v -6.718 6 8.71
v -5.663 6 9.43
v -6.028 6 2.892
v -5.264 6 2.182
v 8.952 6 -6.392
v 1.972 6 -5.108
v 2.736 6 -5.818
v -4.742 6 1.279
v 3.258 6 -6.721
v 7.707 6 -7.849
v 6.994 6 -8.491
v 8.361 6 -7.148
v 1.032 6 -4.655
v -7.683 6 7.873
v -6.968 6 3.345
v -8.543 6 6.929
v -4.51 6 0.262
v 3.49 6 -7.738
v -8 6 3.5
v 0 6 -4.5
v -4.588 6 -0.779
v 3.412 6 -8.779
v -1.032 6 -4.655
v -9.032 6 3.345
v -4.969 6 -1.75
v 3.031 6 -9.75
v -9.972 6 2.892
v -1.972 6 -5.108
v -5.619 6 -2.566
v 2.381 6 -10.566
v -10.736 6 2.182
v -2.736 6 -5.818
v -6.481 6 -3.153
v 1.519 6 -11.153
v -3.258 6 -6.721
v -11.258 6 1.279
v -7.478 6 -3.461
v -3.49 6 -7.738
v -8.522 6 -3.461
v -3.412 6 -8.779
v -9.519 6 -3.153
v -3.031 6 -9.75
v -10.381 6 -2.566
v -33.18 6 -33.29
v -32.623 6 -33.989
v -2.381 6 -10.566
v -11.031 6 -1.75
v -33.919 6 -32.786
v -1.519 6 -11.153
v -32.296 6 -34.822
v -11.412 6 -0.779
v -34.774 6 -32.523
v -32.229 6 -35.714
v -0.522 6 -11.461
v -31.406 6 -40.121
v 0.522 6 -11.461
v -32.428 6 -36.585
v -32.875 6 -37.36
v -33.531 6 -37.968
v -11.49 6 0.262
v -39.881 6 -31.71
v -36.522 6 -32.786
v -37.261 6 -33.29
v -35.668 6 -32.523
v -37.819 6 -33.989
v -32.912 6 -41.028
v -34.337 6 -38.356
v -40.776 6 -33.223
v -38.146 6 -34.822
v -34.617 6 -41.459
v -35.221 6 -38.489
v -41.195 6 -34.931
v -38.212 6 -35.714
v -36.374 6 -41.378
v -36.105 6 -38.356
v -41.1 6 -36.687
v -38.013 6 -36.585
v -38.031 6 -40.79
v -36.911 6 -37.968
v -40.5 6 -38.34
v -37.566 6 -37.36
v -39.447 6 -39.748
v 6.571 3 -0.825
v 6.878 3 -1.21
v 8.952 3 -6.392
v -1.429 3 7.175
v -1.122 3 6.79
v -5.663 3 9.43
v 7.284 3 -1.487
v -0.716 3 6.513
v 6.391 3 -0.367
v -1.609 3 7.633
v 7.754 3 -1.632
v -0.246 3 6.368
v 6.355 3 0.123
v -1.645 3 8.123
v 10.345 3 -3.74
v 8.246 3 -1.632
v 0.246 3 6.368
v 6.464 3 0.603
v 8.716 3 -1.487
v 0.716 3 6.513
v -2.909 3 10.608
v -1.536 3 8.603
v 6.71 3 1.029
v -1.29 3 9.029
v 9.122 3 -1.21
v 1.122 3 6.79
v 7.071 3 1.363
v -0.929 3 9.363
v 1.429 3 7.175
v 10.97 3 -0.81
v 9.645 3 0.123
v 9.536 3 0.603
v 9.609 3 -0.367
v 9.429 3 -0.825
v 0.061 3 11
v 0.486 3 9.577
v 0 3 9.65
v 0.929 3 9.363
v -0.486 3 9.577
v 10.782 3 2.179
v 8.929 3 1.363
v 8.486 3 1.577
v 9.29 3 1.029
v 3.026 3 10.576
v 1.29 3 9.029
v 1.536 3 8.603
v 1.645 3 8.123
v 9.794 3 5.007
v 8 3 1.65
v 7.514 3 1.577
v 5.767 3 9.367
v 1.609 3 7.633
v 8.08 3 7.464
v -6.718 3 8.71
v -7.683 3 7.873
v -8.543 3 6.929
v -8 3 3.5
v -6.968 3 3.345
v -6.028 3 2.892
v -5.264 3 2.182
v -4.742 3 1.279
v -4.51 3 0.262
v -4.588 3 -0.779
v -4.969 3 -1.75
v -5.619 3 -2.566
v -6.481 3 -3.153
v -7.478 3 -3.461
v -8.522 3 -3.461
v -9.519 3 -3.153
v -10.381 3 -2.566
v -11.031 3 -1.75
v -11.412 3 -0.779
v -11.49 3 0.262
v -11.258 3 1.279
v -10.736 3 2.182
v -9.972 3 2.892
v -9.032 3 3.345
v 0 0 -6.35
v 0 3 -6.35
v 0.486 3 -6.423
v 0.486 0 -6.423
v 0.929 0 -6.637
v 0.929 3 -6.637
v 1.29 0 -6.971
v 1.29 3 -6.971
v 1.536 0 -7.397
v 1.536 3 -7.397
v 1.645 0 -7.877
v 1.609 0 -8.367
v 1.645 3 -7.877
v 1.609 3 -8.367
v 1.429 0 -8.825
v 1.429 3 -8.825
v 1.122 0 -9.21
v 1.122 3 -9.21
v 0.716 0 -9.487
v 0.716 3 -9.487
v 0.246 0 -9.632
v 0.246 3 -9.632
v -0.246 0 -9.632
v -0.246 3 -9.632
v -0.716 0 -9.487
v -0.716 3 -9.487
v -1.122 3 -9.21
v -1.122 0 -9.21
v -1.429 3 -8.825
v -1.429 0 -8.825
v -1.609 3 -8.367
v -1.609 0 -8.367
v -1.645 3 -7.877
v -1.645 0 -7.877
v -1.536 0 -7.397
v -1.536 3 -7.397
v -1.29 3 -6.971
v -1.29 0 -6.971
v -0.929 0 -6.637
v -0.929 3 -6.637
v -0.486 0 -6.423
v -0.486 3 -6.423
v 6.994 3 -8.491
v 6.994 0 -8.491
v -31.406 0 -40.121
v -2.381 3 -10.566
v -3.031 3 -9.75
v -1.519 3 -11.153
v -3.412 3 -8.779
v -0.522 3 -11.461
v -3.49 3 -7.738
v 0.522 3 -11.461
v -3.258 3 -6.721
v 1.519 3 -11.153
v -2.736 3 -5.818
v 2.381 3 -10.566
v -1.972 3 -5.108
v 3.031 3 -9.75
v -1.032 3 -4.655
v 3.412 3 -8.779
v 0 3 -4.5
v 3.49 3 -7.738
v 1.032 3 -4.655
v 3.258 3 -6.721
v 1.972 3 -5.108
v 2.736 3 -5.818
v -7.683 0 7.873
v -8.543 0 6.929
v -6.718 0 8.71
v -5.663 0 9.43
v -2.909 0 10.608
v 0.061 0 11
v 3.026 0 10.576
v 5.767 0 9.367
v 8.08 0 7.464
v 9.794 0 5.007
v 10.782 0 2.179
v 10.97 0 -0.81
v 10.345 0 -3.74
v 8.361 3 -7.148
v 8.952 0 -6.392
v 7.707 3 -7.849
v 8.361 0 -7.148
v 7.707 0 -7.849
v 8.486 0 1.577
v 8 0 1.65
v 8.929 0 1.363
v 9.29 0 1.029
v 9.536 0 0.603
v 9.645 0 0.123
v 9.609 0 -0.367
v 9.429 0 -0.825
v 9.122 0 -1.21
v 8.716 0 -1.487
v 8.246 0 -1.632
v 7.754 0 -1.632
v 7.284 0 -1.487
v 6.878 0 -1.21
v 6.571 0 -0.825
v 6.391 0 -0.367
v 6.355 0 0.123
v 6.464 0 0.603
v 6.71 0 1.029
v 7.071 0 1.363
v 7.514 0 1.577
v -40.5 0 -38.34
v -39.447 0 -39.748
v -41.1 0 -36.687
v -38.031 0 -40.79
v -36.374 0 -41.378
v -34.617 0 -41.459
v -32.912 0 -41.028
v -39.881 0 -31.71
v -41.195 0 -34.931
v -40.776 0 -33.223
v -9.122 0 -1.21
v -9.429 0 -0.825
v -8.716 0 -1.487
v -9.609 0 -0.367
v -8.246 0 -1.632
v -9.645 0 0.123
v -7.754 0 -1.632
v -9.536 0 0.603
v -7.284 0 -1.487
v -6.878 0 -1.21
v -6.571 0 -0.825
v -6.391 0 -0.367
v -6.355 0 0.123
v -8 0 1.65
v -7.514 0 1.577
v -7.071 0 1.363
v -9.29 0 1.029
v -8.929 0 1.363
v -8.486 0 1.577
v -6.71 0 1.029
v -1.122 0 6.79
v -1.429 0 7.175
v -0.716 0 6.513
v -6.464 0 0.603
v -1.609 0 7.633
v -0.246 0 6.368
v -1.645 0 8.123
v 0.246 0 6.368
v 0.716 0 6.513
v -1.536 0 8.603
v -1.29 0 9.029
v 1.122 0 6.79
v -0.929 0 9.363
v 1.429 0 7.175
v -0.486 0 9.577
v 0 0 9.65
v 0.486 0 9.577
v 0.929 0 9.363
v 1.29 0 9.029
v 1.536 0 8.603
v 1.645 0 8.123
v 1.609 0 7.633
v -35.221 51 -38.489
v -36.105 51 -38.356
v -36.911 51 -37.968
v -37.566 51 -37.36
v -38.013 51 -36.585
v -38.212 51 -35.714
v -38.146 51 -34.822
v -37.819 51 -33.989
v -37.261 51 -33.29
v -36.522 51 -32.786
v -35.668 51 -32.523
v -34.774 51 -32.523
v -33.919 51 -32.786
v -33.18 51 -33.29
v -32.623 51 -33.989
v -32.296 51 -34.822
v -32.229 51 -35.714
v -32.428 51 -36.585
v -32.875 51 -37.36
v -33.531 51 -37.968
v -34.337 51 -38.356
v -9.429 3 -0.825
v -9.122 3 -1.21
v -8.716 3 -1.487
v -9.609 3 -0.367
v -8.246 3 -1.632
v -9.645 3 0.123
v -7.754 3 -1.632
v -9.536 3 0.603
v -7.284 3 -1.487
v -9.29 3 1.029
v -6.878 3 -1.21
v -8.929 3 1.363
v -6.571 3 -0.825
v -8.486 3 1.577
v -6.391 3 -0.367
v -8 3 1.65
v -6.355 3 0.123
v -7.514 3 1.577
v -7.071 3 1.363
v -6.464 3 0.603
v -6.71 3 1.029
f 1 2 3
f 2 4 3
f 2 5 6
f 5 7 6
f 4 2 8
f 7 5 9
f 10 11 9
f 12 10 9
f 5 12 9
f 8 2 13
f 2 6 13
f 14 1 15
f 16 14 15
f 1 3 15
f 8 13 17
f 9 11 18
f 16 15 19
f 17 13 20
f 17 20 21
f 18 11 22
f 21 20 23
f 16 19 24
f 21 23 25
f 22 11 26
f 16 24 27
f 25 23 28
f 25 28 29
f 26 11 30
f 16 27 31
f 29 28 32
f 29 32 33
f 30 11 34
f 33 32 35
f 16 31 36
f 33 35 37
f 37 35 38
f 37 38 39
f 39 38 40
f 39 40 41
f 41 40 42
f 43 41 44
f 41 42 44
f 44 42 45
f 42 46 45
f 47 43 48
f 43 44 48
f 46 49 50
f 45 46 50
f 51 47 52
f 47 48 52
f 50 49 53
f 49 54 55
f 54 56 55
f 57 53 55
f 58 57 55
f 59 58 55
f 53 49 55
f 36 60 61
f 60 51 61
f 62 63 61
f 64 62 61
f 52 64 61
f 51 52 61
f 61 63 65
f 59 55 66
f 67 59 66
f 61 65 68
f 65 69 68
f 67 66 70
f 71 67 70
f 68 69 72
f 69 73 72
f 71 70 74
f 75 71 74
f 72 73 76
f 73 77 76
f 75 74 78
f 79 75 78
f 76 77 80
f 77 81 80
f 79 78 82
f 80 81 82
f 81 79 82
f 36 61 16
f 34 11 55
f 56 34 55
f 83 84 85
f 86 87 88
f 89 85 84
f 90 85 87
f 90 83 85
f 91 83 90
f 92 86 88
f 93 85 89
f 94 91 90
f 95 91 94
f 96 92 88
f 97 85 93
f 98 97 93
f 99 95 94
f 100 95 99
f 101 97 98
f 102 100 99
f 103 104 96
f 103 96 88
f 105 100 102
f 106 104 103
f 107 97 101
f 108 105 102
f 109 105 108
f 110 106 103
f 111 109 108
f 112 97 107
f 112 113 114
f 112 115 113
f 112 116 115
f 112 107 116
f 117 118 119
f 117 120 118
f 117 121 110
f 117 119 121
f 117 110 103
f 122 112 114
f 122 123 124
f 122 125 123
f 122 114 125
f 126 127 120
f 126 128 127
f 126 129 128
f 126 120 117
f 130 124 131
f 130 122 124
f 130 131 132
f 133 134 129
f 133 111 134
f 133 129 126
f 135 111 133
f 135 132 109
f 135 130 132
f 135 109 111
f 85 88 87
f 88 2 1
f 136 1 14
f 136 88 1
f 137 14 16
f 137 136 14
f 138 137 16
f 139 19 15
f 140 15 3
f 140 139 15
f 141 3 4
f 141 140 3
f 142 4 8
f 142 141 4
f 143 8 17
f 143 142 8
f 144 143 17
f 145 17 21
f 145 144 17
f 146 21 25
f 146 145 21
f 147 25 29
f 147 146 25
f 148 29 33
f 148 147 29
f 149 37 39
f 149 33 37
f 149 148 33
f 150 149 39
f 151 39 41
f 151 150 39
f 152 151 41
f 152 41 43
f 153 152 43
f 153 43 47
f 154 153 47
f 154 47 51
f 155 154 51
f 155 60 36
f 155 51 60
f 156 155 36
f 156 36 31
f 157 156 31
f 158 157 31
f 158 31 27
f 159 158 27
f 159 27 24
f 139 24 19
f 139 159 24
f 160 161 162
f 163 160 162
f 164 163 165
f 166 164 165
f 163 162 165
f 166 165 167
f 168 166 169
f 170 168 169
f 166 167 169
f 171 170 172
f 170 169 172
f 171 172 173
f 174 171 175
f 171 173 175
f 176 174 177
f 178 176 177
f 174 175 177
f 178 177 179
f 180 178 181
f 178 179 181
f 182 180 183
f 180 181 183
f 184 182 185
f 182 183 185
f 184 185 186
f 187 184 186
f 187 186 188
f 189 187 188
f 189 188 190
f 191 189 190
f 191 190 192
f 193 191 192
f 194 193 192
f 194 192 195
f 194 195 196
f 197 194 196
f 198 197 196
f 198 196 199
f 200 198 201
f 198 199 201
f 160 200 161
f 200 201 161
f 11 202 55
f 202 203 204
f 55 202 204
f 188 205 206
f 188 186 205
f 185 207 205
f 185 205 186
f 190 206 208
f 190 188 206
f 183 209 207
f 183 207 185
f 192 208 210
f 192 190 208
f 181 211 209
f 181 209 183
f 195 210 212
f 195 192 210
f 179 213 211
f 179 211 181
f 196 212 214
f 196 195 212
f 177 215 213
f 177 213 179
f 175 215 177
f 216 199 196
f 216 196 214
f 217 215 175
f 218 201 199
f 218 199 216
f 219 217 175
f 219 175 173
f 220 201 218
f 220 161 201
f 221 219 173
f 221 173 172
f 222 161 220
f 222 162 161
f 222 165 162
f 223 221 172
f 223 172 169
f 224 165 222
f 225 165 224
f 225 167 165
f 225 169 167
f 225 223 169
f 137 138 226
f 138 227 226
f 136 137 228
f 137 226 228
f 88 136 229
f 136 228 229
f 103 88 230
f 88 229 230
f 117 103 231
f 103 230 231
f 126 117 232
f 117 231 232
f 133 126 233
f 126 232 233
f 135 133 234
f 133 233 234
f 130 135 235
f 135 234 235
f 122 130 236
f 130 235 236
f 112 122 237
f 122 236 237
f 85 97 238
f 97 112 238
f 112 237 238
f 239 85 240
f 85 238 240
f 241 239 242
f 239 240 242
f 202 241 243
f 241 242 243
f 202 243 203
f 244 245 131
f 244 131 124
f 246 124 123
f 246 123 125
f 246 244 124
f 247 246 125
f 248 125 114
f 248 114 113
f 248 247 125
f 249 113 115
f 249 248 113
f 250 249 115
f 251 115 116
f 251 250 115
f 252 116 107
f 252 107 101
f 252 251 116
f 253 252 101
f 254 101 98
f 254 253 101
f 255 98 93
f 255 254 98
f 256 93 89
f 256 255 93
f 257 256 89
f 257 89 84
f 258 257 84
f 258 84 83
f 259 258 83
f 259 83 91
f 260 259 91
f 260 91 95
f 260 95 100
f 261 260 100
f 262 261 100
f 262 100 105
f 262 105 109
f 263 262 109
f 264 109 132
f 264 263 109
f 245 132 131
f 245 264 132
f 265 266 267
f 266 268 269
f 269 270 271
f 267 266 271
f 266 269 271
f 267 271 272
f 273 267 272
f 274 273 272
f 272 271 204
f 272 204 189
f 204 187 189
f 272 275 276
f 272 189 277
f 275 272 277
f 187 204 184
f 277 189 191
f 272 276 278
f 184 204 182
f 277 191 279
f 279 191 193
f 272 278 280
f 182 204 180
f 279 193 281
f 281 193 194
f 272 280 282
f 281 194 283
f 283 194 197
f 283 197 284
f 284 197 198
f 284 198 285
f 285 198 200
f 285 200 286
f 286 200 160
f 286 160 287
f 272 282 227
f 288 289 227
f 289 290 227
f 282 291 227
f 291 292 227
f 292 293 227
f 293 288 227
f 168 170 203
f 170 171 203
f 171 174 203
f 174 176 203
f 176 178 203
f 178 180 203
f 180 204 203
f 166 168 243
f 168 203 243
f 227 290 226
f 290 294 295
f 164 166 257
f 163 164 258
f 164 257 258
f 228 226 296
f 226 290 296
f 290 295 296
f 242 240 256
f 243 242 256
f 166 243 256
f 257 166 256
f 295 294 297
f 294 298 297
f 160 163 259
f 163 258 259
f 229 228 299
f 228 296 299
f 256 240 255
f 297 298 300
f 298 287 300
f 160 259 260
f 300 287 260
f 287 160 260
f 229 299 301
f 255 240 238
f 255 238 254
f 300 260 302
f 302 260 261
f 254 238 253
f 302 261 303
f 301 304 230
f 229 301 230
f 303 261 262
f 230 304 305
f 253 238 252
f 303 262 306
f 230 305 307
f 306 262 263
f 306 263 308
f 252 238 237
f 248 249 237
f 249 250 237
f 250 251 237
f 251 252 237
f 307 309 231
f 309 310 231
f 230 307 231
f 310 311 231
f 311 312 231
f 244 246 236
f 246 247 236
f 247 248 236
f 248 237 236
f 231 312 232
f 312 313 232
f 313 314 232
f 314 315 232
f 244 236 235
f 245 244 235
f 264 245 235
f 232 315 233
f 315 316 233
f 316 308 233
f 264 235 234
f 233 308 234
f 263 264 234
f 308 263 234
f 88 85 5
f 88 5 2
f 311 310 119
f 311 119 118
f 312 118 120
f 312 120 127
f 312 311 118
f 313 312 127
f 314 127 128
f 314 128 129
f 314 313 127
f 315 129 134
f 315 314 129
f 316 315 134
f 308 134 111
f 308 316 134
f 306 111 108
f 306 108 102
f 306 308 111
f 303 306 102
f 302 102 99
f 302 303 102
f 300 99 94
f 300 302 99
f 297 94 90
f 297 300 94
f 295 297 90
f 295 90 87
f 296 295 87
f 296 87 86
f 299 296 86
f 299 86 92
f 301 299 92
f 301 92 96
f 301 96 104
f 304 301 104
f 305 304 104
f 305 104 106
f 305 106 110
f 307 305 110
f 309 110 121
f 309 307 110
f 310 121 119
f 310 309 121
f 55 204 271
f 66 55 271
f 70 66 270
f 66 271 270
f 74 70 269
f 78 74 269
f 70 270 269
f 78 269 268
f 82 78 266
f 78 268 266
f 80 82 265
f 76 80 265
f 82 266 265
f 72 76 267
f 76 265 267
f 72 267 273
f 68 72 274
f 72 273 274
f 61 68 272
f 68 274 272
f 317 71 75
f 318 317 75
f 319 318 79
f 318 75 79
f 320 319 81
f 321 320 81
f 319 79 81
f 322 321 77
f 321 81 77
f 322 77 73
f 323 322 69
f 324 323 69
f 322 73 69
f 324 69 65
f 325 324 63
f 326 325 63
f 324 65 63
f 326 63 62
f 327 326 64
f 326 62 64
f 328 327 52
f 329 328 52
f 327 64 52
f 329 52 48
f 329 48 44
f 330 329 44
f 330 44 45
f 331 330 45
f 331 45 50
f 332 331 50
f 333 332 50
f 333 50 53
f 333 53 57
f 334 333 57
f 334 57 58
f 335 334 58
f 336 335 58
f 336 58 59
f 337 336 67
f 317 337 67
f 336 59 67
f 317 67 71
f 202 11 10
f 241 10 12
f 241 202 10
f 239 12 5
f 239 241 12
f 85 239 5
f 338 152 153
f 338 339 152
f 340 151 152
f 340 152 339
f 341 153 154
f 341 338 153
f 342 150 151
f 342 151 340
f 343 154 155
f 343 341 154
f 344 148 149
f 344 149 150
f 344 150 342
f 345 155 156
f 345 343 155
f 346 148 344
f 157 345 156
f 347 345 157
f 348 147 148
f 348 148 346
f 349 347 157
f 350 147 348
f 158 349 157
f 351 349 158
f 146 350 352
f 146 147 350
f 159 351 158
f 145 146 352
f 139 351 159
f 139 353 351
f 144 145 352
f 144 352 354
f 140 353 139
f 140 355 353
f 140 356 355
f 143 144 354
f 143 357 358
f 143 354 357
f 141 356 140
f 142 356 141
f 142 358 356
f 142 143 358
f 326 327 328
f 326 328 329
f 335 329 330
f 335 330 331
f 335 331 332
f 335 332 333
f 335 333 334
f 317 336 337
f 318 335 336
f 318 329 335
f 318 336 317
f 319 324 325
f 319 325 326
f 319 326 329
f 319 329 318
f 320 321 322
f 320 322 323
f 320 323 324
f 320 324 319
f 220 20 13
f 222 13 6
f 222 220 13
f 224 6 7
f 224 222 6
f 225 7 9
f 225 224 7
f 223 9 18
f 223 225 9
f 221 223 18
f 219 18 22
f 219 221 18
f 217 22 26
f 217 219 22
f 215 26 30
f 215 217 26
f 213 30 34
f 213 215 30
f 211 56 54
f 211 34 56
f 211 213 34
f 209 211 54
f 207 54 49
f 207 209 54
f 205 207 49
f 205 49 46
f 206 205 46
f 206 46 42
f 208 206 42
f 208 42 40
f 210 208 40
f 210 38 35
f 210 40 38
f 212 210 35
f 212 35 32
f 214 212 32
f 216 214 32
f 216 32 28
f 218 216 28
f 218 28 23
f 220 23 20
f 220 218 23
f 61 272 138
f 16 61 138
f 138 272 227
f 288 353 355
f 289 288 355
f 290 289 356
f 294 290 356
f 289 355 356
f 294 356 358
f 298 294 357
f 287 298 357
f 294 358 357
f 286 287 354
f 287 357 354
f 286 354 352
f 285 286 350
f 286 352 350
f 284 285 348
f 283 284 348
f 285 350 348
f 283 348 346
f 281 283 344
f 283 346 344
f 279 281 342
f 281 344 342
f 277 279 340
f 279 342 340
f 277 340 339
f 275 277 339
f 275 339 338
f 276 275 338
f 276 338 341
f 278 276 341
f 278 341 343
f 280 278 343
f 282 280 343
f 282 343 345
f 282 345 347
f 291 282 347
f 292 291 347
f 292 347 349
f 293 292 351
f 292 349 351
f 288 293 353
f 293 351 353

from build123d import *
from build123d.topology import SkipClean

# Parameters (mm, degrees)
SKETCH_1_R        = 11
SKETCH_1_R_2      = 1.65
EXTRUDE_2_DEPTH   = 3
EXTRUDE_3_DEPTH   = 3
EXTRUDE_START     = -6
EXTRUDE_4_DEPTH   = 6
SKETCH_4_R        = 3
EXTRUDE_5_DEPTH   = 45
SKETCH_5_R        = 1.65
EXTRUDE_6_DEPTH   = 5
EXTRUDE_6_2_DEPTH = 5
SKETCH_6_R        = 3.5
EXTRUDE_7_DEPTH   = 4
EXTRUDE_7_2_DEPTH = 4


with BuildPart() as part:
    # 草图1 → 凸台-拉伸2 (new body)
    with BuildSketch(Plane(origin=(0, 0, 0), x_dir=(1, 0, 0), z_dir=(0, 1, 0))):
        Circle(SKETCH_1_R)
        with Locations((0, -8)):
            Circle(SKETCH_1_R_2, mode=Mode.SUBTRACT)
        with Locations((8, 0)):
            Circle(SKETCH_1_R_2, mode=Mode.SUBTRACT)
    extrude(amount=EXTRUDE_2_DEPTH)

    # 草图2 → 凸台-拉伸3 (add)
    with SkipClean():  # the faces are left unmerged after this step: merging them gives an invalid solid
        with BuildSketch(Plane(origin=(0, 3, 0), x_dir=(1, 0, 0), z_dir=(0, 1, 0))):
            with BuildLine():
                Line((8.952279946, 6.391923323), (-5.663051219, -9.430262504))
                ThreePointArc((-5.663051219, -9.430262504), (-8.080231896, 7.463903303), (8.952279946, 6.391923323))
            make_face()
        extrude(amount=EXTRUDE_3_DEPTH)

    # 草图3 → 凸台-拉伸4 (add)
    with BuildSketch(Plane(origin=(0, 6, 0), x_dir=(1, 0, 0), z_dir=(0, 1, 0)).offset(EXTRUDE_START)):
        with BuildLine():
            Line((-5.663051219, -9.430262504), (8.952279946, 6.391923323))
            ThreePointArc((8.952279946, 6.391923323), (8.041723321, 7.505377141), (6.993667, 8.490501863))
            Line((6.993667, 8.490501863), (-31.406072494, 40.120550975))
            ThreePointArc((-31.406072494, 40.120550975), (-39.447295943, 39.748092317), (-39.880826602, 31.709930141))
            Line((-39.880826602, 31.709930141), (-8.543382198, -6.928969665))
            ThreePointArc((-8.543382198, -6.928969665), (-7.212475586, -8.305431712), (-5.663051219, -9.430262504))
        make_face()
    extrude(amount=EXTRUDE_4_DEPTH)

    # 草图4 → 凸台-拉伸5 (add)
    with BuildSketch(Plane(origin=(0, 6, 0), x_dir=(1, 0, 0), z_dir=(0, 1, 0))):
        with Locations((-35.220799949, 35.48936814)):
            Circle(SKETCH_4_R)
    extrude(amount=EXTRUDE_5_DEPTH)


with BuildPart() as body_2:
    # 草图5 → 凸台-拉伸6 (new, symmetric)
    with BuildSketch(Plane(origin=(0, 3, 0), x_dir=(1, 0, 0), z_dir=(0, 1, 0))):
        with Locations((-8, 0)):
            Circle(SKETCH_5_R)
    extrude(amount=EXTRUDE_6_DEPTH, both=True)


with BuildPart() as body_3:
    # 草图5 → Extrude 6 2 (new, symmetric)
    with BuildSketch(Plane(origin=(0, 3, 0), x_dir=(1, 0, 0), z_dir=(0, 1, 0))):
        with Locations((0, 8)):
            Circle(SKETCH_5_R)
    extrude(amount=EXTRUDE_6_2_DEPTH, both=True)


with BuildPart() as part_1:
    add(part.part)

    # Combine 1: cut body 3, body 2
    add(body_3.part, mode=Mode.SUBTRACT)
    add(body_2.part, mode=Mode.SUBTRACT)


with BuildPart() as body_2_2:
    # 草图6 → 凸台-拉伸7 (new body)
    with BuildSketch(Plane(origin=(0, 3, 0), x_dir=(1, 0, 0), z_dir=(0, 1, 0))):
        with Locations((0, 8)):
            Circle(SKETCH_6_R)
    extrude(amount=EXTRUDE_7_DEPTH)


with BuildPart() as body_3_2:
    # 草图6 → Extrude 7 2 (new body)
    with BuildSketch(Plane(origin=(0, 3, 0), x_dir=(1, 0, 0), z_dir=(0, 1, 0))):
        with Locations((-8, 0)):
            Circle(SKETCH_6_R)
    extrude(amount=EXTRUDE_7_2_DEPTH)


with BuildPart() as part_2:
    add(part_1.part)

    # Combine 2: cut body 2 2, body 3 2
    add(body_2_2.part, mode=Mode.SUBTRACT)
    add(body_3_2.part, mode=Mode.SUBTRACT)


solid = part_2.part
